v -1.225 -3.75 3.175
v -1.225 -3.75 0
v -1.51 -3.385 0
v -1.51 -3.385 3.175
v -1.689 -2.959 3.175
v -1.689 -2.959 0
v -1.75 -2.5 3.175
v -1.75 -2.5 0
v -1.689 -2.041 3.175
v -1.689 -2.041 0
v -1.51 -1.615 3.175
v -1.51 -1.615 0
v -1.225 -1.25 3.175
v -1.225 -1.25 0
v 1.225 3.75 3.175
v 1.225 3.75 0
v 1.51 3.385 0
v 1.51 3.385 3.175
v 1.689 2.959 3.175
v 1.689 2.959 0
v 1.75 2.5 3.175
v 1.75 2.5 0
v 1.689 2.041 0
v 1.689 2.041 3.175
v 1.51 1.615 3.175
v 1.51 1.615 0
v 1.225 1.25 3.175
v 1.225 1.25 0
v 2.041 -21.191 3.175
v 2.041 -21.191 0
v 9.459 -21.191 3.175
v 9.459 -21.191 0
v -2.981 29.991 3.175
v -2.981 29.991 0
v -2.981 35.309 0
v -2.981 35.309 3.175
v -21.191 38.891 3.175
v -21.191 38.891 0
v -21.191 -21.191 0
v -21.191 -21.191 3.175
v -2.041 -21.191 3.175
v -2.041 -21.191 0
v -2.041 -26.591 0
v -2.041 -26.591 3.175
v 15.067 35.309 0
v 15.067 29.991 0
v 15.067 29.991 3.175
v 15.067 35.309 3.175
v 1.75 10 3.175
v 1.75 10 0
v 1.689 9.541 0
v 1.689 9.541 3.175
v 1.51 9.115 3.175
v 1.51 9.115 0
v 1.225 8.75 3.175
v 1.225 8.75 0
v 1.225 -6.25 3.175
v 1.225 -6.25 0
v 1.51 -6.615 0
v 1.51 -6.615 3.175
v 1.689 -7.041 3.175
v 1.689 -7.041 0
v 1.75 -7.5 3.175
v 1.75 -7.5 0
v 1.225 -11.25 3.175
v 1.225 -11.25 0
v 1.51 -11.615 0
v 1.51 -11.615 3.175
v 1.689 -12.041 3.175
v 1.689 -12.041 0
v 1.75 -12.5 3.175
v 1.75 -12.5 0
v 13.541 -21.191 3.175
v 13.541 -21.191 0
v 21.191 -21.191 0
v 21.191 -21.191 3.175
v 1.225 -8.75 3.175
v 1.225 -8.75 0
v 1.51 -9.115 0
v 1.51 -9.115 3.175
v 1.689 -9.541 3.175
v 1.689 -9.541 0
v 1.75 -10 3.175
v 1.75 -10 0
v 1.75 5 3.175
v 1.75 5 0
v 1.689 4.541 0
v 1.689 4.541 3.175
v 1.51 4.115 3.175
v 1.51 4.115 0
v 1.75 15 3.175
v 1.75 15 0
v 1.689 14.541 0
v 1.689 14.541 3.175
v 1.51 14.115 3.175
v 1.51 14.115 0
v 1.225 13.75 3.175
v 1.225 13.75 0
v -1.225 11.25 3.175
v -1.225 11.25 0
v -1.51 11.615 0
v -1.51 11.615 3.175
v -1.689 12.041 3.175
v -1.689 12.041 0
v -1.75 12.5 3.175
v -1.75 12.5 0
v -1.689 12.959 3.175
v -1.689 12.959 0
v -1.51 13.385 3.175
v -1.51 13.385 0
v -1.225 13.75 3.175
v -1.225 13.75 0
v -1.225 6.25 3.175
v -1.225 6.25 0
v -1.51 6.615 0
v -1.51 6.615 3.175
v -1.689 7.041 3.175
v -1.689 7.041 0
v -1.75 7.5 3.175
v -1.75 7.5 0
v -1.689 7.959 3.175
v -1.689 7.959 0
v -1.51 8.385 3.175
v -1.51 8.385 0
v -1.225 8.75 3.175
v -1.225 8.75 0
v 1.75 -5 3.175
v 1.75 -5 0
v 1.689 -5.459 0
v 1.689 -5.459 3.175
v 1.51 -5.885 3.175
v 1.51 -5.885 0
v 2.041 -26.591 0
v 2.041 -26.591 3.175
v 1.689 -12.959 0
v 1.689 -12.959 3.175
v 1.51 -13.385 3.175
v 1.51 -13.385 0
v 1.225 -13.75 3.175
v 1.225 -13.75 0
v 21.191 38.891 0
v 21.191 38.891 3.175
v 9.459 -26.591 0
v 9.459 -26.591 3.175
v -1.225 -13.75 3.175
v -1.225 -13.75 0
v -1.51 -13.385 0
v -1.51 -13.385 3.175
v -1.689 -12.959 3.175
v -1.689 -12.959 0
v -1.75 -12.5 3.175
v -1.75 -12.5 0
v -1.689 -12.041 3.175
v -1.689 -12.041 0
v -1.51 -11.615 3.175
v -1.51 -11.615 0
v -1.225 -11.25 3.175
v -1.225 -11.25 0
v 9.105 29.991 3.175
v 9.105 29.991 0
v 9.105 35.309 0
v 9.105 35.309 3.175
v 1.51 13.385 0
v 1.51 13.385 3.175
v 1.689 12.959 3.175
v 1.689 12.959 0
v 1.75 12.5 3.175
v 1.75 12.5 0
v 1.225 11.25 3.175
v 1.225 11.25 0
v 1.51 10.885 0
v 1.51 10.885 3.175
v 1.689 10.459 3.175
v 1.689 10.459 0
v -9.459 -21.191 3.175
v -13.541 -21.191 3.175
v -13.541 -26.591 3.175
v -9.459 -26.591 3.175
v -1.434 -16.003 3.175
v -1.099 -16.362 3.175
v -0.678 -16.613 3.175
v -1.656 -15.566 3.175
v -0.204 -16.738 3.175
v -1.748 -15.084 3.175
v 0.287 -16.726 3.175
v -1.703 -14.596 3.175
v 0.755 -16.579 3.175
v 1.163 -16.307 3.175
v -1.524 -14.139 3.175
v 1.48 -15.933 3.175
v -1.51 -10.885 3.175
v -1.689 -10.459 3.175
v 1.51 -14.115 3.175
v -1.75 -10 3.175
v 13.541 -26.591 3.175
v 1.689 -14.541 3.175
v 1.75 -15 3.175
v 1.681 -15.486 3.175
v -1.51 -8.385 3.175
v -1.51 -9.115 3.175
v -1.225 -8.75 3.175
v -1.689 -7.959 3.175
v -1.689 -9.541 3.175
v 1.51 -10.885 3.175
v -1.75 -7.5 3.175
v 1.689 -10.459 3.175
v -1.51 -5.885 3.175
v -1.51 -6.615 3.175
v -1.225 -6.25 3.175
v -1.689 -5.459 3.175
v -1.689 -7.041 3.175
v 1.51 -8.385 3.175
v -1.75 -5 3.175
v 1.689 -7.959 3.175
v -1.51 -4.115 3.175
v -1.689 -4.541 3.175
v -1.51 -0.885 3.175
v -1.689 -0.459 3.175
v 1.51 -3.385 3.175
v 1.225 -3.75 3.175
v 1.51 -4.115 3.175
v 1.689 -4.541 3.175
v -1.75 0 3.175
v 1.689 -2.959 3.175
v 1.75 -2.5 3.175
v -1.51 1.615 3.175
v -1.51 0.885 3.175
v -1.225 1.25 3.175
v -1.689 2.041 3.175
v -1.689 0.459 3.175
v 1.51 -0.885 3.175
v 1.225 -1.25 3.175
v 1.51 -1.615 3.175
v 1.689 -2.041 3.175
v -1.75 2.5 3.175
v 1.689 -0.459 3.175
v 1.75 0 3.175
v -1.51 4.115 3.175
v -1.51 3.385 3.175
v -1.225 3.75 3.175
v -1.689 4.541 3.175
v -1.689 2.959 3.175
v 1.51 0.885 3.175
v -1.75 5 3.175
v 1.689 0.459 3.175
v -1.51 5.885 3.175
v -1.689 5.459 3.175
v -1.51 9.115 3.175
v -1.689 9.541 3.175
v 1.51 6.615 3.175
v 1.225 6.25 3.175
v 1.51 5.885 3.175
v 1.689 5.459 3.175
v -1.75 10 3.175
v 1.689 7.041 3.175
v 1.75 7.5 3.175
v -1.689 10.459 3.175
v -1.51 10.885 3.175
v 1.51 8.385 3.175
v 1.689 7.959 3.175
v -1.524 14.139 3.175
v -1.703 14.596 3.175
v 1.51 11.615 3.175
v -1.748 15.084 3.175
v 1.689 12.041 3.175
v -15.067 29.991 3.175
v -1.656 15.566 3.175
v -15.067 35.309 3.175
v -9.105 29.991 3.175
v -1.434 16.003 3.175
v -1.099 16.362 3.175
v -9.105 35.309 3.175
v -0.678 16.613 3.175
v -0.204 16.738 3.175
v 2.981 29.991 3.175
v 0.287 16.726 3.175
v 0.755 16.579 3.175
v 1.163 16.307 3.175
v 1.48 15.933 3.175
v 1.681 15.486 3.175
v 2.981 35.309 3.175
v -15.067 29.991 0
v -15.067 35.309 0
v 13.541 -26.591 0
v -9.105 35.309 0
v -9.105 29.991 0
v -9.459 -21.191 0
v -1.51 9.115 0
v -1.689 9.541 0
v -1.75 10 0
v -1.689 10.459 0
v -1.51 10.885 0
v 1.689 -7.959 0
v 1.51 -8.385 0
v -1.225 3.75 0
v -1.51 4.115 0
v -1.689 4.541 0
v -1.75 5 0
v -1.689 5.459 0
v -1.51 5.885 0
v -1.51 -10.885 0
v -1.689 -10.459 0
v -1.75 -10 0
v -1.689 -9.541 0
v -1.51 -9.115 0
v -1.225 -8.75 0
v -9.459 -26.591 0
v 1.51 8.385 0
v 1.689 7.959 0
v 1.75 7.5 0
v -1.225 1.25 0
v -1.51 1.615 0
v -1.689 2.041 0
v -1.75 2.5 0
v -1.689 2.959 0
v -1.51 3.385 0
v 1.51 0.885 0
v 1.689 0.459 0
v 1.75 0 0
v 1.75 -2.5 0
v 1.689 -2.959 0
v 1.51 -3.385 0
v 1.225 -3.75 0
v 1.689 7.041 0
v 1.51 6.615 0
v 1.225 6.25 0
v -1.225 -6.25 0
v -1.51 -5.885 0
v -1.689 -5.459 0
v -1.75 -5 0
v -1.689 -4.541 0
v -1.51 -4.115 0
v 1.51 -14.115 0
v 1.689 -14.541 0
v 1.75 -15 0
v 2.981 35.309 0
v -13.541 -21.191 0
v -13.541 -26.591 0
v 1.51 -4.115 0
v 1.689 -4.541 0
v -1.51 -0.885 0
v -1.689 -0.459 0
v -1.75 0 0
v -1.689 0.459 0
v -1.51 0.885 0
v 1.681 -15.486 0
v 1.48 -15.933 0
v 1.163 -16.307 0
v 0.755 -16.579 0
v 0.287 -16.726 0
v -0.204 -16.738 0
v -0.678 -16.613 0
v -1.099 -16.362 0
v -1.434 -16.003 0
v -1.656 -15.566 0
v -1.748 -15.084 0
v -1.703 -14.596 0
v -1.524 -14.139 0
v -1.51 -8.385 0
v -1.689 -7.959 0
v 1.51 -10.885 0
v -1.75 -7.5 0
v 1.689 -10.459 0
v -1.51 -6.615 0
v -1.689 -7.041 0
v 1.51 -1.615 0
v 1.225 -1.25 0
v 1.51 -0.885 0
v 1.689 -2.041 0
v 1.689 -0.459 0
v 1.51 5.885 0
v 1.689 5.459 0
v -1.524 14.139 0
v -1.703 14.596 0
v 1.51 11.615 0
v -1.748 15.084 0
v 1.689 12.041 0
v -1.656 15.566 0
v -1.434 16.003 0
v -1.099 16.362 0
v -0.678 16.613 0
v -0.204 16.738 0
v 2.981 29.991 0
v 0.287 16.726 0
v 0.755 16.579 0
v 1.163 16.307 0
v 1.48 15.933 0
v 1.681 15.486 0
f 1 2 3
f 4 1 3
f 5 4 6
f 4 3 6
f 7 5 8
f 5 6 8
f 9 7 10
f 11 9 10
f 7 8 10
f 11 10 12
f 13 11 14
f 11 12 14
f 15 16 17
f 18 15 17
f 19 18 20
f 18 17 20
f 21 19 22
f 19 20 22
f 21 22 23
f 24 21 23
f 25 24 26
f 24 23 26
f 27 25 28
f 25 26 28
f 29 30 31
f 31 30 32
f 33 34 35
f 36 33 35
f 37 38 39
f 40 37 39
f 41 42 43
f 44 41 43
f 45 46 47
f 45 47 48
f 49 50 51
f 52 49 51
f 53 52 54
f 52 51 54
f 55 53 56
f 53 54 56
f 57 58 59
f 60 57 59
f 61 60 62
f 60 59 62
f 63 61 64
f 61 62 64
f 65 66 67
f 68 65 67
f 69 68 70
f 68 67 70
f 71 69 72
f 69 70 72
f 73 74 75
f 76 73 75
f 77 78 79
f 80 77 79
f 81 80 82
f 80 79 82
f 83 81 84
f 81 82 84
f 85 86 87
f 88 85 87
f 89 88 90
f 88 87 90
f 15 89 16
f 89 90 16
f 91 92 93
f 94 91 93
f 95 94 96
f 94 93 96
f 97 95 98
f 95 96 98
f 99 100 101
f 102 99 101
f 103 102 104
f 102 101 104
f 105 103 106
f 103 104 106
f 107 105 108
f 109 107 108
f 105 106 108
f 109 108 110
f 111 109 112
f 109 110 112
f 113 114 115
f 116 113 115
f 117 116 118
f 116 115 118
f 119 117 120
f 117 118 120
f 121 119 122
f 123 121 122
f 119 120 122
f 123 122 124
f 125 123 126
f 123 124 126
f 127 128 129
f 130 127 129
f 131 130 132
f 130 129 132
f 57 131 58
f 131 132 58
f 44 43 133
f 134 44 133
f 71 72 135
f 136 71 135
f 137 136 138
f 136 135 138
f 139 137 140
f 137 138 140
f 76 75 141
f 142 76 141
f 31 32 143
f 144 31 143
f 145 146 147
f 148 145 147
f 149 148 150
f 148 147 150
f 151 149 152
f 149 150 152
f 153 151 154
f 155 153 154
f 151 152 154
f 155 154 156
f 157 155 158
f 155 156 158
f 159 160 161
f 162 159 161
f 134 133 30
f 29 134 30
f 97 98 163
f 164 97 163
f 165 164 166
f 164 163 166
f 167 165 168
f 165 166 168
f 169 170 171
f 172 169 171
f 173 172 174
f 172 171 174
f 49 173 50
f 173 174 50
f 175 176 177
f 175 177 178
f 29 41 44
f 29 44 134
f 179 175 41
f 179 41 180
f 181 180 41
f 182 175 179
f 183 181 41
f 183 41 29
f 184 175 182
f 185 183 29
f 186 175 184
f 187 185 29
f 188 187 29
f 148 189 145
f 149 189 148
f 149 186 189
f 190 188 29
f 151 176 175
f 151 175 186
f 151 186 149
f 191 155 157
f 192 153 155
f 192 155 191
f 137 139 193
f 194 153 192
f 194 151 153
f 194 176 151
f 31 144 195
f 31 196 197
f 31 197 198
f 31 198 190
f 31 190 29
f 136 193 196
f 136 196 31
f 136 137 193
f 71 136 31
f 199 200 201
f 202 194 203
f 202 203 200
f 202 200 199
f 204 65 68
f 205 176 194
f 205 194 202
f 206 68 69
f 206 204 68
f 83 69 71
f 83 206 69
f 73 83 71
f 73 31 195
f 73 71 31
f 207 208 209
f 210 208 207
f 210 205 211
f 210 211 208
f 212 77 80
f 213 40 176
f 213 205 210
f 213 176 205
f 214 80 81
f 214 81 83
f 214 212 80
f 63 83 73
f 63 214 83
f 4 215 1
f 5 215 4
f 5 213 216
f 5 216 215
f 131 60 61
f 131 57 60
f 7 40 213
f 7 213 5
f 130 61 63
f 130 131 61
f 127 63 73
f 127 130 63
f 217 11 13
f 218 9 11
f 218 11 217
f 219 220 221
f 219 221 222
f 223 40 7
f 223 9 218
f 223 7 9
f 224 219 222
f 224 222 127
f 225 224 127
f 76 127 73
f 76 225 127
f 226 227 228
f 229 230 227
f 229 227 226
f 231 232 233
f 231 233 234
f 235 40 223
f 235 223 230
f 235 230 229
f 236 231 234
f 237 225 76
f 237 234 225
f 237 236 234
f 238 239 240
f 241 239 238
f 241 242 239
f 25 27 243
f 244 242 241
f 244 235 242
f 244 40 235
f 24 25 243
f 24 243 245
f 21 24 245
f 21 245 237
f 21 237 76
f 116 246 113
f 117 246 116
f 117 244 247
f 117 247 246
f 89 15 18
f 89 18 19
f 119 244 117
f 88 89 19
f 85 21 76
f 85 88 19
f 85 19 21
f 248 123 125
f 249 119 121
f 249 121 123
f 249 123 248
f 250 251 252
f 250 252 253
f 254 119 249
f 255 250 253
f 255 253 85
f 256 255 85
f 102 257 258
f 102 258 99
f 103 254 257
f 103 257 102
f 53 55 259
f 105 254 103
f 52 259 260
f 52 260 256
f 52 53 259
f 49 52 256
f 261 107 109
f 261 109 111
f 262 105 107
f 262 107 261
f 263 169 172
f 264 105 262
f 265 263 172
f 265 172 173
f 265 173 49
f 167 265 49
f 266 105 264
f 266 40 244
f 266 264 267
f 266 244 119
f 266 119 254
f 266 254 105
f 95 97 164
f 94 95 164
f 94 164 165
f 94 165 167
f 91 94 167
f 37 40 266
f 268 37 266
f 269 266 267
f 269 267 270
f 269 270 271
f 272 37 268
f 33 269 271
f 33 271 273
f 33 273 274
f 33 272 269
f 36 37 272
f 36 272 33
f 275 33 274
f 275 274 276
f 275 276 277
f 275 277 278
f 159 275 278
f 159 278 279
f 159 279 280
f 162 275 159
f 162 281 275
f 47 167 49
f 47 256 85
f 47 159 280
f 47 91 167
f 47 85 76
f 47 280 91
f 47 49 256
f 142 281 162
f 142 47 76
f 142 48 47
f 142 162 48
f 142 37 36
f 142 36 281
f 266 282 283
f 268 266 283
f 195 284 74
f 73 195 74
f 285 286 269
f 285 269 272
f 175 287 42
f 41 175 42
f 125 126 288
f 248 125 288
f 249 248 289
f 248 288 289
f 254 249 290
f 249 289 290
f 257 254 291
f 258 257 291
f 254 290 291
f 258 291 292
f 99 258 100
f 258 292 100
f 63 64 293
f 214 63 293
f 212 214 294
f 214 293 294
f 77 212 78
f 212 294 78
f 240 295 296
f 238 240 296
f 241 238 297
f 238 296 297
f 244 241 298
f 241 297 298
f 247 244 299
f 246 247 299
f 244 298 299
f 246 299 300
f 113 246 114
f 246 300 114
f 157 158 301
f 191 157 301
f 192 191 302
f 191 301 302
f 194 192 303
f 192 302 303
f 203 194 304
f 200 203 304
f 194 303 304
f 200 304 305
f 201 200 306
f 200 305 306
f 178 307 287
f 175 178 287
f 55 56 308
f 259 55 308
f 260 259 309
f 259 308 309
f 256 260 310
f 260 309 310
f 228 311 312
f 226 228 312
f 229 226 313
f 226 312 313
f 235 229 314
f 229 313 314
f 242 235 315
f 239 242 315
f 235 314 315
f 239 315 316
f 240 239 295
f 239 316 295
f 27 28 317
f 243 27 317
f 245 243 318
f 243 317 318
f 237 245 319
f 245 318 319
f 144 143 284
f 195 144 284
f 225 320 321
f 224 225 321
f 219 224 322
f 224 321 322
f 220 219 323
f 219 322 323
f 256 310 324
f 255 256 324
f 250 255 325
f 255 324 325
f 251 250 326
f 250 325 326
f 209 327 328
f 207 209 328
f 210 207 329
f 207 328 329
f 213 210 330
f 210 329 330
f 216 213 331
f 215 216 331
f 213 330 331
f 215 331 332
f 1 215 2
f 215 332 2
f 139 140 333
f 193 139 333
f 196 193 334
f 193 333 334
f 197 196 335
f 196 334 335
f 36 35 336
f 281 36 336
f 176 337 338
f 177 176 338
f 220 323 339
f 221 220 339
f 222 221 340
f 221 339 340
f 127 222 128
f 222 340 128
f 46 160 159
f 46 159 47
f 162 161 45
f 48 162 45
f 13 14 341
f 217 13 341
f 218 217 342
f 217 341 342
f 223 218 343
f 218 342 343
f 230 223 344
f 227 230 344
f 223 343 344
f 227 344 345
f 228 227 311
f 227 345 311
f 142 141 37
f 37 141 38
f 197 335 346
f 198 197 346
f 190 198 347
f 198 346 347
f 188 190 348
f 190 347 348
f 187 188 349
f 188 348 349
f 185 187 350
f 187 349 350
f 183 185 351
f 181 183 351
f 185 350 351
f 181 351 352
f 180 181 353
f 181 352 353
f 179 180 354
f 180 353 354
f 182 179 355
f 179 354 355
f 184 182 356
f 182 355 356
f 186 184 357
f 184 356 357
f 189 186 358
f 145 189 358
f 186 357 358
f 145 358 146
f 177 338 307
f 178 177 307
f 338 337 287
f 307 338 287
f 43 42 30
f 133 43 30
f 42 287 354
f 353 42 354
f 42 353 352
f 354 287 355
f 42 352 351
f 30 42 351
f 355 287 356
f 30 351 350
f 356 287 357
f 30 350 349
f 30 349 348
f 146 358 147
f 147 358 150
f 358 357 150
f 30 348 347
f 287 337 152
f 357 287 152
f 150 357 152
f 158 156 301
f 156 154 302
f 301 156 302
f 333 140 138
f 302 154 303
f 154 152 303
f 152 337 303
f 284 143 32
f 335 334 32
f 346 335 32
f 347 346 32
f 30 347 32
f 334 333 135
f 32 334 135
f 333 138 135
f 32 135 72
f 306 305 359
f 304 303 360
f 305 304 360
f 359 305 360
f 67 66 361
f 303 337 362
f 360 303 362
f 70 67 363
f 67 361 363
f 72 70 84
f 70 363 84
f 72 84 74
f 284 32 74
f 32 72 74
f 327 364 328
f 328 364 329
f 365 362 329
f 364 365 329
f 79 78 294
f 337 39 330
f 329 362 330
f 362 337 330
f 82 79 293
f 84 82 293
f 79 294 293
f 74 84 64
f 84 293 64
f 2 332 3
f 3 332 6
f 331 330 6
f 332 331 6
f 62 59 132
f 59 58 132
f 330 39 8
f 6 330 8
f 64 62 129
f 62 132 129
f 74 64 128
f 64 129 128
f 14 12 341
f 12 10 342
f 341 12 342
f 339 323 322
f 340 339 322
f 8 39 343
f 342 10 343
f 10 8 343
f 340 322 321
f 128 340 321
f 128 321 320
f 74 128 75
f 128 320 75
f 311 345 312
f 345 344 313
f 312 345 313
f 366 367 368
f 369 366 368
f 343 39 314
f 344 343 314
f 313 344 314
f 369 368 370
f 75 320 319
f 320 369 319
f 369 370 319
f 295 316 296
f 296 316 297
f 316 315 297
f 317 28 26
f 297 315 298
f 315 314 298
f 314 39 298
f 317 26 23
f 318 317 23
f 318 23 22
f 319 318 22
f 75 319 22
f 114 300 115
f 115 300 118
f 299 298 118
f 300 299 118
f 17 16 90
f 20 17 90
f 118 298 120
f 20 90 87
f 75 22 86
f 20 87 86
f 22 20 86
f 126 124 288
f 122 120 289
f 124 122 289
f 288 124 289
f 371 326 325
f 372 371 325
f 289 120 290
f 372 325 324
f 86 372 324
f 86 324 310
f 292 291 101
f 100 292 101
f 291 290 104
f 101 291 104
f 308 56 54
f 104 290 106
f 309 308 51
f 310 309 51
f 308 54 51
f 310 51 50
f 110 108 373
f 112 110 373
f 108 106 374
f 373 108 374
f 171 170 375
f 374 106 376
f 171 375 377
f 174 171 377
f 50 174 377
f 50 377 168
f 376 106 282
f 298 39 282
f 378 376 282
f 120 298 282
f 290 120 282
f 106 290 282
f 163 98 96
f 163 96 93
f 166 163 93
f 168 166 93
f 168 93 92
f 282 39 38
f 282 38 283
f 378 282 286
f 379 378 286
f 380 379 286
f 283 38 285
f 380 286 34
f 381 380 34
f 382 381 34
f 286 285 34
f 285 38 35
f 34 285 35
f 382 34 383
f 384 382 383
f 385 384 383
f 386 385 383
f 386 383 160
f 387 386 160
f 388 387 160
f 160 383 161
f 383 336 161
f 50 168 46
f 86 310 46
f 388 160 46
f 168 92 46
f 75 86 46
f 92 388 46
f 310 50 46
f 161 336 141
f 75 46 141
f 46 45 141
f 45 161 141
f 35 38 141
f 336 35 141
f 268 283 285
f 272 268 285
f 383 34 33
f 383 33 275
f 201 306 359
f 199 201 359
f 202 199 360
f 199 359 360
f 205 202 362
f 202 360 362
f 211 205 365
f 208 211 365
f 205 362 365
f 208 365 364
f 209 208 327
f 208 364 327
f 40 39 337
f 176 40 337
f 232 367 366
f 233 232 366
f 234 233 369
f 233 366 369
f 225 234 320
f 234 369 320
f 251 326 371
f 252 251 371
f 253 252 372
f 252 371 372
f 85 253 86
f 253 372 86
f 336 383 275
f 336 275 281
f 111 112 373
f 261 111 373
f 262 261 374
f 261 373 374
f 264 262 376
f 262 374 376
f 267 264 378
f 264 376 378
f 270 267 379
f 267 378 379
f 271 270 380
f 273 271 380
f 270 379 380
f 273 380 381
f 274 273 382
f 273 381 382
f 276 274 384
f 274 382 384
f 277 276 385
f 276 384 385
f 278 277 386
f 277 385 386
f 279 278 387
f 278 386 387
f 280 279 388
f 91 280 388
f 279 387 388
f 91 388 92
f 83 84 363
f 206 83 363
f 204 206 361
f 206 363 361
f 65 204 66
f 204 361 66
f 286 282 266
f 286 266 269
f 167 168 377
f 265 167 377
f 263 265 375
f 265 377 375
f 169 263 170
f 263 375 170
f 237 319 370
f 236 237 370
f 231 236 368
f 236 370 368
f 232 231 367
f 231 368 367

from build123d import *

# Parameters (mm, degrees)
SKETCH1_W                 = 6.042857143
SKETCH1_H                 = 5.4
SKETCH1_W_2               = 6.042857142
SKETCH1_W_3               = 4
BOSS_EXTRUDE1_DEPTH       = 3.175
BOSS_EXTRUDE2_START       = -3.175
BOSS_EXTRUDE2_OUTLINE_W   = 6.042857143
BOSS_EXTRUDE2_OUTLINE_H   = 5.4
BOSS_EXTRUDE2_OUTLINE_W_2 = 5.961577143
BOSS_EXTRUDE2_OUTLINE_H_2 = 5.31872
BOSS_EXTRUDE2_OUTLINE_W_3 = 6.042857142
BOSS_EXTRUDE2_OUTLINE_W_4 = 5.961577142
BOSS_EXTRUDE2_DEPTH       = 3.175


# Read off the part's stored shape, not the designer's step: Boss-Extrude2
with BuildPart() as part:
    # Sketch1 → Boss-Extrude1 (new body)
    # profile 1 of 4: a face of its own
    with BuildSketch(Plane.XY):
        Polygon((21.15, 38.85), (-21.15, 38.85), (-21.15, -21.15), (-13.5, -21.15), (-9.5, -21.15), (-2, -21.15), (2, -21.15), (9.5, -21.15), (13.5, -21.15), (21.15, -21.15), align=None)
        with BuildLine():
            ThreePointArc((-1.224744871, 11.25), (-1.75, 12.5), (-1.224744871, 13.75))
            ThreePointArc((-1.224744871, 13.75), (-0.67793675, 16.613351097), (1.75, 15))
            ThreePointArc((1.75, 15), (1.613351097, 14.32206325), (1.224744871, 13.75))
            ThreePointArc((1.224744871, 13.75), (1.613351097, 13.17793675), (1.75, 12.5))
            ThreePointArc((1.75, 12.5), (1.613351097, 11.82206325), (1.224744871, 11.25))
            ThreePointArc((1.224744871, 11.25), (1.613351097, 10.67793675), (1.75, 10))
            ThreePointArc((1.75, 10), (1.613351097, 9.32206325), (1.224744871, 8.75))
            ThreePointArc((1.224744871, 8.75), (1.613351097, 8.17793675), (1.75, 7.5))
            ThreePointArc((1.75, 7.5), (1.613351097, 6.82206325), (1.224744871, 6.25))
            ThreePointArc((1.224744871, 6.25), (1.613351097, 5.67793675), (1.75, 5))
            ThreePointArc((1.75, 5), (1.613351097, 4.32206325), (1.224744871, 3.75))
            ThreePointArc((1.224744871, 3.75), (1.613351097, 3.17793675), (1.75, 2.5))
            ThreePointArc((1.75, 2.5), (1.613351097, 1.82206325), (1.224744871, 1.25))
            ThreePointArc((1.224744871, 1.25), (1.613351097, 0.67793675), (1.75, 0))
            ThreePointArc((1.75, 0), (1.613351097, -0.67793675), (1.224744871, -1.25))
            ThreePointArc((1.224744871, -1.25), (1.613351097, -1.82206325), (1.75, -2.5))
            ThreePointArc((1.75, -2.5), (1.613351097, -3.17793675), (1.224744871, -3.75))
            ThreePointArc((1.224744871, -3.75), (1.613351097, -4.32206325), (1.75, -5))
            ThreePointArc((1.75, -5), (1.613351097, -5.67793675), (1.224744871, -6.25))
            ThreePointArc((1.224744871, -6.25), (1.613351097, -6.82206325), (1.75, -7.5))
            ThreePointArc((1.75, -7.5), (1.613351097, -8.17793675), (1.224744871, -8.75))
            ThreePointArc((1.224744871, -8.75), (1.613351097, -9.32206325), (1.75, -10))
            ThreePointArc((1.75, -10), (1.613351097, -10.67793675), (1.224744871, -11.25))
            ThreePointArc((1.224744871, -11.25), (1.613351097, -11.82206325), (1.75, -12.5))
            ThreePointArc((1.75, -12.5), (1.613351097, -13.17793675), (1.224744871, -13.75))
            ThreePointArc((1.224744871, -13.75), (1.613351097, -14.32206325), (1.75, -15))
            ThreePointArc((1.75, -15), (-0.67793675, -16.613351097), (-1.224744871, -13.75))
            ThreePointArc((-1.224744871, -13.75), (-1.75, -12.5), (-1.224744871, -11.25))
            ThreePointArc((-1.224744871, -11.25), (-1.75, -10), (-1.224744871, -8.75))
            ThreePointArc((-1.224744871, -8.75), (-1.75, -7.5), (-1.224744871, -6.25))
            ThreePointArc((-1.224744871, -6.25), (-1.75, -5), (-1.224744871, -3.75))
            ThreePointArc((-1.224744871, -3.75), (-1.75, -2.5), (-1.224744871, -1.25))
            ThreePointArc((-1.224744871, -1.25), (-1.75, 0), (-1.224744871, 1.25))
            ThreePointArc((-1.224744871, 1.25), (-1.75, 2.5), (-1.224744871, 3.75))
            ThreePointArc((-1.224744871, 3.75), (-1.75, 5), (-1.224744871, 6.25))
            ThreePointArc((-1.224744871, 6.25), (-1.75, 7.5), (-1.224744871, 8.75))
            ThreePointArc((-1.224744871, 8.75), (-1.75, 10), (-1.224744871, 11.25))
        make_face(mode=Mode.SUBTRACT)
        with Locations((-12.085714285, 32.65)):
            Rectangle(SKETCH1_W, SKETCH1_H, mode=Mode.SUBTRACT)
        with Locations((0, 32.65)):
            Rectangle(SKETCH1_W_2, SKETCH1_H, mode=Mode.SUBTRACT)
        with Locations((12.085714285, 32.65)):
            Rectangle(SKETCH1_W, SKETCH1_H, mode=Mode.SUBTRACT)
    # profile 2 of 4: a face of its own
    with BuildSketch(Plane.XY):
        with Locations((-11.5, -23.85)):
            Rectangle(SKETCH1_W_3, SKETCH1_H)
    # profile 3 of 4: a face of its own
    with BuildSketch(Plane.XY):
        with Locations((11.5, -23.85)):
            Rectangle(SKETCH1_W_3, SKETCH1_H)
    # profile 4 of 4: a face of its own
    with BuildSketch(Plane.XY):
        with Locations((0, -23.85)):
            Rectangle(SKETCH1_W_3, SKETCH1_H)
    extrude(amount=BOSS_EXTRUDE1_DEPTH)

    # Boss-Extrude2 outline → Boss-Extrude2 (add)
    # profile 1 of 4: a face of its own
    with BuildSketch(Plane.XY.offset(3.175).offset(BOSS_EXTRUDE2_START)):
        Polygon((13.54064, -26.59064), (13.54064, -21.19064), (21.19064, -21.19064), (21.19064, 38.89064), (-21.19064, 38.89064), (-21.19064, -21.19064), (-13.54064, -21.19064), (-13.54064, -26.59064), (-9.45936, -26.59064), (-9.45936, -21.19064), (-2.04064, -21.19064), (-2.04064, -26.59064), (2.04064, -26.59064), (2.04064, -21.19064), (9.45936, -21.19064), (9.45936, -26.59064), align=None)
        Polygon((21.15, 38.85), (21.15, -21.15), (13.5, -21.15), (13.5, -26.55), (9.5, -26.55), (9.5, -21.15), (2, -21.15), (2, -26.55), (-2, -26.55), (-2, -21.15), (-9.5, -21.15), (-9.5, -26.55), (-13.5, -26.55), (-13.5, -21.15), (-21.15, -21.15), (-21.15, 38.85), align=None, mode=Mode.SUBTRACT)
    # profile 2 of 4: a face of its own
    with BuildSketch(Plane.XY.offset(3.175).offset(BOSS_EXTRUDE2_START)):
        with Locations((12.085714285, 32.65)):
            Rectangle(BOSS_EXTRUDE2_OUTLINE_W, BOSS_EXTRUDE2_OUTLINE_H)
        with Locations((12.085714285, 32.65)):
            Rectangle(BOSS_EXTRUDE2_OUTLINE_W_2, BOSS_EXTRUDE2_OUTLINE_H_2, mode=Mode.SUBTRACT)
    # profile 3 of 4: a face of its own
    with BuildSketch(Plane.XY.offset(3.175).offset(BOSS_EXTRUDE2_START)):
        with Locations((0, 32.65)):
            Rectangle(BOSS_EXTRUDE2_OUTLINE_W_3, BOSS_EXTRUDE2_OUTLINE_H)
        with Locations((0, 32.65)):
            Rectangle(BOSS_EXTRUDE2_OUTLINE_W_4, BOSS_EXTRUDE2_OUTLINE_H_2, mode=Mode.SUBTRACT)
    # profile 4 of 4: a face of its own
    with BuildSketch(Plane.XY.offset(3.175).offset(BOSS_EXTRUDE2_START)):
        with Locations((-12.085714285, 32.65)):
            Rectangle(BOSS_EXTRUDE2_OUTLINE_W, BOSS_EXTRUDE2_OUTLINE_H)
        with Locations((-12.085714285, 32.65)):
            Rectangle(BOSS_EXTRUDE2_OUTLINE_W_2, BOSS_EXTRUDE2_OUTLINE_H_2, mode=Mode.SUBTRACT)
    extrude(amount=BOSS_EXTRUDE2_DEPTH)


solid = part.part
